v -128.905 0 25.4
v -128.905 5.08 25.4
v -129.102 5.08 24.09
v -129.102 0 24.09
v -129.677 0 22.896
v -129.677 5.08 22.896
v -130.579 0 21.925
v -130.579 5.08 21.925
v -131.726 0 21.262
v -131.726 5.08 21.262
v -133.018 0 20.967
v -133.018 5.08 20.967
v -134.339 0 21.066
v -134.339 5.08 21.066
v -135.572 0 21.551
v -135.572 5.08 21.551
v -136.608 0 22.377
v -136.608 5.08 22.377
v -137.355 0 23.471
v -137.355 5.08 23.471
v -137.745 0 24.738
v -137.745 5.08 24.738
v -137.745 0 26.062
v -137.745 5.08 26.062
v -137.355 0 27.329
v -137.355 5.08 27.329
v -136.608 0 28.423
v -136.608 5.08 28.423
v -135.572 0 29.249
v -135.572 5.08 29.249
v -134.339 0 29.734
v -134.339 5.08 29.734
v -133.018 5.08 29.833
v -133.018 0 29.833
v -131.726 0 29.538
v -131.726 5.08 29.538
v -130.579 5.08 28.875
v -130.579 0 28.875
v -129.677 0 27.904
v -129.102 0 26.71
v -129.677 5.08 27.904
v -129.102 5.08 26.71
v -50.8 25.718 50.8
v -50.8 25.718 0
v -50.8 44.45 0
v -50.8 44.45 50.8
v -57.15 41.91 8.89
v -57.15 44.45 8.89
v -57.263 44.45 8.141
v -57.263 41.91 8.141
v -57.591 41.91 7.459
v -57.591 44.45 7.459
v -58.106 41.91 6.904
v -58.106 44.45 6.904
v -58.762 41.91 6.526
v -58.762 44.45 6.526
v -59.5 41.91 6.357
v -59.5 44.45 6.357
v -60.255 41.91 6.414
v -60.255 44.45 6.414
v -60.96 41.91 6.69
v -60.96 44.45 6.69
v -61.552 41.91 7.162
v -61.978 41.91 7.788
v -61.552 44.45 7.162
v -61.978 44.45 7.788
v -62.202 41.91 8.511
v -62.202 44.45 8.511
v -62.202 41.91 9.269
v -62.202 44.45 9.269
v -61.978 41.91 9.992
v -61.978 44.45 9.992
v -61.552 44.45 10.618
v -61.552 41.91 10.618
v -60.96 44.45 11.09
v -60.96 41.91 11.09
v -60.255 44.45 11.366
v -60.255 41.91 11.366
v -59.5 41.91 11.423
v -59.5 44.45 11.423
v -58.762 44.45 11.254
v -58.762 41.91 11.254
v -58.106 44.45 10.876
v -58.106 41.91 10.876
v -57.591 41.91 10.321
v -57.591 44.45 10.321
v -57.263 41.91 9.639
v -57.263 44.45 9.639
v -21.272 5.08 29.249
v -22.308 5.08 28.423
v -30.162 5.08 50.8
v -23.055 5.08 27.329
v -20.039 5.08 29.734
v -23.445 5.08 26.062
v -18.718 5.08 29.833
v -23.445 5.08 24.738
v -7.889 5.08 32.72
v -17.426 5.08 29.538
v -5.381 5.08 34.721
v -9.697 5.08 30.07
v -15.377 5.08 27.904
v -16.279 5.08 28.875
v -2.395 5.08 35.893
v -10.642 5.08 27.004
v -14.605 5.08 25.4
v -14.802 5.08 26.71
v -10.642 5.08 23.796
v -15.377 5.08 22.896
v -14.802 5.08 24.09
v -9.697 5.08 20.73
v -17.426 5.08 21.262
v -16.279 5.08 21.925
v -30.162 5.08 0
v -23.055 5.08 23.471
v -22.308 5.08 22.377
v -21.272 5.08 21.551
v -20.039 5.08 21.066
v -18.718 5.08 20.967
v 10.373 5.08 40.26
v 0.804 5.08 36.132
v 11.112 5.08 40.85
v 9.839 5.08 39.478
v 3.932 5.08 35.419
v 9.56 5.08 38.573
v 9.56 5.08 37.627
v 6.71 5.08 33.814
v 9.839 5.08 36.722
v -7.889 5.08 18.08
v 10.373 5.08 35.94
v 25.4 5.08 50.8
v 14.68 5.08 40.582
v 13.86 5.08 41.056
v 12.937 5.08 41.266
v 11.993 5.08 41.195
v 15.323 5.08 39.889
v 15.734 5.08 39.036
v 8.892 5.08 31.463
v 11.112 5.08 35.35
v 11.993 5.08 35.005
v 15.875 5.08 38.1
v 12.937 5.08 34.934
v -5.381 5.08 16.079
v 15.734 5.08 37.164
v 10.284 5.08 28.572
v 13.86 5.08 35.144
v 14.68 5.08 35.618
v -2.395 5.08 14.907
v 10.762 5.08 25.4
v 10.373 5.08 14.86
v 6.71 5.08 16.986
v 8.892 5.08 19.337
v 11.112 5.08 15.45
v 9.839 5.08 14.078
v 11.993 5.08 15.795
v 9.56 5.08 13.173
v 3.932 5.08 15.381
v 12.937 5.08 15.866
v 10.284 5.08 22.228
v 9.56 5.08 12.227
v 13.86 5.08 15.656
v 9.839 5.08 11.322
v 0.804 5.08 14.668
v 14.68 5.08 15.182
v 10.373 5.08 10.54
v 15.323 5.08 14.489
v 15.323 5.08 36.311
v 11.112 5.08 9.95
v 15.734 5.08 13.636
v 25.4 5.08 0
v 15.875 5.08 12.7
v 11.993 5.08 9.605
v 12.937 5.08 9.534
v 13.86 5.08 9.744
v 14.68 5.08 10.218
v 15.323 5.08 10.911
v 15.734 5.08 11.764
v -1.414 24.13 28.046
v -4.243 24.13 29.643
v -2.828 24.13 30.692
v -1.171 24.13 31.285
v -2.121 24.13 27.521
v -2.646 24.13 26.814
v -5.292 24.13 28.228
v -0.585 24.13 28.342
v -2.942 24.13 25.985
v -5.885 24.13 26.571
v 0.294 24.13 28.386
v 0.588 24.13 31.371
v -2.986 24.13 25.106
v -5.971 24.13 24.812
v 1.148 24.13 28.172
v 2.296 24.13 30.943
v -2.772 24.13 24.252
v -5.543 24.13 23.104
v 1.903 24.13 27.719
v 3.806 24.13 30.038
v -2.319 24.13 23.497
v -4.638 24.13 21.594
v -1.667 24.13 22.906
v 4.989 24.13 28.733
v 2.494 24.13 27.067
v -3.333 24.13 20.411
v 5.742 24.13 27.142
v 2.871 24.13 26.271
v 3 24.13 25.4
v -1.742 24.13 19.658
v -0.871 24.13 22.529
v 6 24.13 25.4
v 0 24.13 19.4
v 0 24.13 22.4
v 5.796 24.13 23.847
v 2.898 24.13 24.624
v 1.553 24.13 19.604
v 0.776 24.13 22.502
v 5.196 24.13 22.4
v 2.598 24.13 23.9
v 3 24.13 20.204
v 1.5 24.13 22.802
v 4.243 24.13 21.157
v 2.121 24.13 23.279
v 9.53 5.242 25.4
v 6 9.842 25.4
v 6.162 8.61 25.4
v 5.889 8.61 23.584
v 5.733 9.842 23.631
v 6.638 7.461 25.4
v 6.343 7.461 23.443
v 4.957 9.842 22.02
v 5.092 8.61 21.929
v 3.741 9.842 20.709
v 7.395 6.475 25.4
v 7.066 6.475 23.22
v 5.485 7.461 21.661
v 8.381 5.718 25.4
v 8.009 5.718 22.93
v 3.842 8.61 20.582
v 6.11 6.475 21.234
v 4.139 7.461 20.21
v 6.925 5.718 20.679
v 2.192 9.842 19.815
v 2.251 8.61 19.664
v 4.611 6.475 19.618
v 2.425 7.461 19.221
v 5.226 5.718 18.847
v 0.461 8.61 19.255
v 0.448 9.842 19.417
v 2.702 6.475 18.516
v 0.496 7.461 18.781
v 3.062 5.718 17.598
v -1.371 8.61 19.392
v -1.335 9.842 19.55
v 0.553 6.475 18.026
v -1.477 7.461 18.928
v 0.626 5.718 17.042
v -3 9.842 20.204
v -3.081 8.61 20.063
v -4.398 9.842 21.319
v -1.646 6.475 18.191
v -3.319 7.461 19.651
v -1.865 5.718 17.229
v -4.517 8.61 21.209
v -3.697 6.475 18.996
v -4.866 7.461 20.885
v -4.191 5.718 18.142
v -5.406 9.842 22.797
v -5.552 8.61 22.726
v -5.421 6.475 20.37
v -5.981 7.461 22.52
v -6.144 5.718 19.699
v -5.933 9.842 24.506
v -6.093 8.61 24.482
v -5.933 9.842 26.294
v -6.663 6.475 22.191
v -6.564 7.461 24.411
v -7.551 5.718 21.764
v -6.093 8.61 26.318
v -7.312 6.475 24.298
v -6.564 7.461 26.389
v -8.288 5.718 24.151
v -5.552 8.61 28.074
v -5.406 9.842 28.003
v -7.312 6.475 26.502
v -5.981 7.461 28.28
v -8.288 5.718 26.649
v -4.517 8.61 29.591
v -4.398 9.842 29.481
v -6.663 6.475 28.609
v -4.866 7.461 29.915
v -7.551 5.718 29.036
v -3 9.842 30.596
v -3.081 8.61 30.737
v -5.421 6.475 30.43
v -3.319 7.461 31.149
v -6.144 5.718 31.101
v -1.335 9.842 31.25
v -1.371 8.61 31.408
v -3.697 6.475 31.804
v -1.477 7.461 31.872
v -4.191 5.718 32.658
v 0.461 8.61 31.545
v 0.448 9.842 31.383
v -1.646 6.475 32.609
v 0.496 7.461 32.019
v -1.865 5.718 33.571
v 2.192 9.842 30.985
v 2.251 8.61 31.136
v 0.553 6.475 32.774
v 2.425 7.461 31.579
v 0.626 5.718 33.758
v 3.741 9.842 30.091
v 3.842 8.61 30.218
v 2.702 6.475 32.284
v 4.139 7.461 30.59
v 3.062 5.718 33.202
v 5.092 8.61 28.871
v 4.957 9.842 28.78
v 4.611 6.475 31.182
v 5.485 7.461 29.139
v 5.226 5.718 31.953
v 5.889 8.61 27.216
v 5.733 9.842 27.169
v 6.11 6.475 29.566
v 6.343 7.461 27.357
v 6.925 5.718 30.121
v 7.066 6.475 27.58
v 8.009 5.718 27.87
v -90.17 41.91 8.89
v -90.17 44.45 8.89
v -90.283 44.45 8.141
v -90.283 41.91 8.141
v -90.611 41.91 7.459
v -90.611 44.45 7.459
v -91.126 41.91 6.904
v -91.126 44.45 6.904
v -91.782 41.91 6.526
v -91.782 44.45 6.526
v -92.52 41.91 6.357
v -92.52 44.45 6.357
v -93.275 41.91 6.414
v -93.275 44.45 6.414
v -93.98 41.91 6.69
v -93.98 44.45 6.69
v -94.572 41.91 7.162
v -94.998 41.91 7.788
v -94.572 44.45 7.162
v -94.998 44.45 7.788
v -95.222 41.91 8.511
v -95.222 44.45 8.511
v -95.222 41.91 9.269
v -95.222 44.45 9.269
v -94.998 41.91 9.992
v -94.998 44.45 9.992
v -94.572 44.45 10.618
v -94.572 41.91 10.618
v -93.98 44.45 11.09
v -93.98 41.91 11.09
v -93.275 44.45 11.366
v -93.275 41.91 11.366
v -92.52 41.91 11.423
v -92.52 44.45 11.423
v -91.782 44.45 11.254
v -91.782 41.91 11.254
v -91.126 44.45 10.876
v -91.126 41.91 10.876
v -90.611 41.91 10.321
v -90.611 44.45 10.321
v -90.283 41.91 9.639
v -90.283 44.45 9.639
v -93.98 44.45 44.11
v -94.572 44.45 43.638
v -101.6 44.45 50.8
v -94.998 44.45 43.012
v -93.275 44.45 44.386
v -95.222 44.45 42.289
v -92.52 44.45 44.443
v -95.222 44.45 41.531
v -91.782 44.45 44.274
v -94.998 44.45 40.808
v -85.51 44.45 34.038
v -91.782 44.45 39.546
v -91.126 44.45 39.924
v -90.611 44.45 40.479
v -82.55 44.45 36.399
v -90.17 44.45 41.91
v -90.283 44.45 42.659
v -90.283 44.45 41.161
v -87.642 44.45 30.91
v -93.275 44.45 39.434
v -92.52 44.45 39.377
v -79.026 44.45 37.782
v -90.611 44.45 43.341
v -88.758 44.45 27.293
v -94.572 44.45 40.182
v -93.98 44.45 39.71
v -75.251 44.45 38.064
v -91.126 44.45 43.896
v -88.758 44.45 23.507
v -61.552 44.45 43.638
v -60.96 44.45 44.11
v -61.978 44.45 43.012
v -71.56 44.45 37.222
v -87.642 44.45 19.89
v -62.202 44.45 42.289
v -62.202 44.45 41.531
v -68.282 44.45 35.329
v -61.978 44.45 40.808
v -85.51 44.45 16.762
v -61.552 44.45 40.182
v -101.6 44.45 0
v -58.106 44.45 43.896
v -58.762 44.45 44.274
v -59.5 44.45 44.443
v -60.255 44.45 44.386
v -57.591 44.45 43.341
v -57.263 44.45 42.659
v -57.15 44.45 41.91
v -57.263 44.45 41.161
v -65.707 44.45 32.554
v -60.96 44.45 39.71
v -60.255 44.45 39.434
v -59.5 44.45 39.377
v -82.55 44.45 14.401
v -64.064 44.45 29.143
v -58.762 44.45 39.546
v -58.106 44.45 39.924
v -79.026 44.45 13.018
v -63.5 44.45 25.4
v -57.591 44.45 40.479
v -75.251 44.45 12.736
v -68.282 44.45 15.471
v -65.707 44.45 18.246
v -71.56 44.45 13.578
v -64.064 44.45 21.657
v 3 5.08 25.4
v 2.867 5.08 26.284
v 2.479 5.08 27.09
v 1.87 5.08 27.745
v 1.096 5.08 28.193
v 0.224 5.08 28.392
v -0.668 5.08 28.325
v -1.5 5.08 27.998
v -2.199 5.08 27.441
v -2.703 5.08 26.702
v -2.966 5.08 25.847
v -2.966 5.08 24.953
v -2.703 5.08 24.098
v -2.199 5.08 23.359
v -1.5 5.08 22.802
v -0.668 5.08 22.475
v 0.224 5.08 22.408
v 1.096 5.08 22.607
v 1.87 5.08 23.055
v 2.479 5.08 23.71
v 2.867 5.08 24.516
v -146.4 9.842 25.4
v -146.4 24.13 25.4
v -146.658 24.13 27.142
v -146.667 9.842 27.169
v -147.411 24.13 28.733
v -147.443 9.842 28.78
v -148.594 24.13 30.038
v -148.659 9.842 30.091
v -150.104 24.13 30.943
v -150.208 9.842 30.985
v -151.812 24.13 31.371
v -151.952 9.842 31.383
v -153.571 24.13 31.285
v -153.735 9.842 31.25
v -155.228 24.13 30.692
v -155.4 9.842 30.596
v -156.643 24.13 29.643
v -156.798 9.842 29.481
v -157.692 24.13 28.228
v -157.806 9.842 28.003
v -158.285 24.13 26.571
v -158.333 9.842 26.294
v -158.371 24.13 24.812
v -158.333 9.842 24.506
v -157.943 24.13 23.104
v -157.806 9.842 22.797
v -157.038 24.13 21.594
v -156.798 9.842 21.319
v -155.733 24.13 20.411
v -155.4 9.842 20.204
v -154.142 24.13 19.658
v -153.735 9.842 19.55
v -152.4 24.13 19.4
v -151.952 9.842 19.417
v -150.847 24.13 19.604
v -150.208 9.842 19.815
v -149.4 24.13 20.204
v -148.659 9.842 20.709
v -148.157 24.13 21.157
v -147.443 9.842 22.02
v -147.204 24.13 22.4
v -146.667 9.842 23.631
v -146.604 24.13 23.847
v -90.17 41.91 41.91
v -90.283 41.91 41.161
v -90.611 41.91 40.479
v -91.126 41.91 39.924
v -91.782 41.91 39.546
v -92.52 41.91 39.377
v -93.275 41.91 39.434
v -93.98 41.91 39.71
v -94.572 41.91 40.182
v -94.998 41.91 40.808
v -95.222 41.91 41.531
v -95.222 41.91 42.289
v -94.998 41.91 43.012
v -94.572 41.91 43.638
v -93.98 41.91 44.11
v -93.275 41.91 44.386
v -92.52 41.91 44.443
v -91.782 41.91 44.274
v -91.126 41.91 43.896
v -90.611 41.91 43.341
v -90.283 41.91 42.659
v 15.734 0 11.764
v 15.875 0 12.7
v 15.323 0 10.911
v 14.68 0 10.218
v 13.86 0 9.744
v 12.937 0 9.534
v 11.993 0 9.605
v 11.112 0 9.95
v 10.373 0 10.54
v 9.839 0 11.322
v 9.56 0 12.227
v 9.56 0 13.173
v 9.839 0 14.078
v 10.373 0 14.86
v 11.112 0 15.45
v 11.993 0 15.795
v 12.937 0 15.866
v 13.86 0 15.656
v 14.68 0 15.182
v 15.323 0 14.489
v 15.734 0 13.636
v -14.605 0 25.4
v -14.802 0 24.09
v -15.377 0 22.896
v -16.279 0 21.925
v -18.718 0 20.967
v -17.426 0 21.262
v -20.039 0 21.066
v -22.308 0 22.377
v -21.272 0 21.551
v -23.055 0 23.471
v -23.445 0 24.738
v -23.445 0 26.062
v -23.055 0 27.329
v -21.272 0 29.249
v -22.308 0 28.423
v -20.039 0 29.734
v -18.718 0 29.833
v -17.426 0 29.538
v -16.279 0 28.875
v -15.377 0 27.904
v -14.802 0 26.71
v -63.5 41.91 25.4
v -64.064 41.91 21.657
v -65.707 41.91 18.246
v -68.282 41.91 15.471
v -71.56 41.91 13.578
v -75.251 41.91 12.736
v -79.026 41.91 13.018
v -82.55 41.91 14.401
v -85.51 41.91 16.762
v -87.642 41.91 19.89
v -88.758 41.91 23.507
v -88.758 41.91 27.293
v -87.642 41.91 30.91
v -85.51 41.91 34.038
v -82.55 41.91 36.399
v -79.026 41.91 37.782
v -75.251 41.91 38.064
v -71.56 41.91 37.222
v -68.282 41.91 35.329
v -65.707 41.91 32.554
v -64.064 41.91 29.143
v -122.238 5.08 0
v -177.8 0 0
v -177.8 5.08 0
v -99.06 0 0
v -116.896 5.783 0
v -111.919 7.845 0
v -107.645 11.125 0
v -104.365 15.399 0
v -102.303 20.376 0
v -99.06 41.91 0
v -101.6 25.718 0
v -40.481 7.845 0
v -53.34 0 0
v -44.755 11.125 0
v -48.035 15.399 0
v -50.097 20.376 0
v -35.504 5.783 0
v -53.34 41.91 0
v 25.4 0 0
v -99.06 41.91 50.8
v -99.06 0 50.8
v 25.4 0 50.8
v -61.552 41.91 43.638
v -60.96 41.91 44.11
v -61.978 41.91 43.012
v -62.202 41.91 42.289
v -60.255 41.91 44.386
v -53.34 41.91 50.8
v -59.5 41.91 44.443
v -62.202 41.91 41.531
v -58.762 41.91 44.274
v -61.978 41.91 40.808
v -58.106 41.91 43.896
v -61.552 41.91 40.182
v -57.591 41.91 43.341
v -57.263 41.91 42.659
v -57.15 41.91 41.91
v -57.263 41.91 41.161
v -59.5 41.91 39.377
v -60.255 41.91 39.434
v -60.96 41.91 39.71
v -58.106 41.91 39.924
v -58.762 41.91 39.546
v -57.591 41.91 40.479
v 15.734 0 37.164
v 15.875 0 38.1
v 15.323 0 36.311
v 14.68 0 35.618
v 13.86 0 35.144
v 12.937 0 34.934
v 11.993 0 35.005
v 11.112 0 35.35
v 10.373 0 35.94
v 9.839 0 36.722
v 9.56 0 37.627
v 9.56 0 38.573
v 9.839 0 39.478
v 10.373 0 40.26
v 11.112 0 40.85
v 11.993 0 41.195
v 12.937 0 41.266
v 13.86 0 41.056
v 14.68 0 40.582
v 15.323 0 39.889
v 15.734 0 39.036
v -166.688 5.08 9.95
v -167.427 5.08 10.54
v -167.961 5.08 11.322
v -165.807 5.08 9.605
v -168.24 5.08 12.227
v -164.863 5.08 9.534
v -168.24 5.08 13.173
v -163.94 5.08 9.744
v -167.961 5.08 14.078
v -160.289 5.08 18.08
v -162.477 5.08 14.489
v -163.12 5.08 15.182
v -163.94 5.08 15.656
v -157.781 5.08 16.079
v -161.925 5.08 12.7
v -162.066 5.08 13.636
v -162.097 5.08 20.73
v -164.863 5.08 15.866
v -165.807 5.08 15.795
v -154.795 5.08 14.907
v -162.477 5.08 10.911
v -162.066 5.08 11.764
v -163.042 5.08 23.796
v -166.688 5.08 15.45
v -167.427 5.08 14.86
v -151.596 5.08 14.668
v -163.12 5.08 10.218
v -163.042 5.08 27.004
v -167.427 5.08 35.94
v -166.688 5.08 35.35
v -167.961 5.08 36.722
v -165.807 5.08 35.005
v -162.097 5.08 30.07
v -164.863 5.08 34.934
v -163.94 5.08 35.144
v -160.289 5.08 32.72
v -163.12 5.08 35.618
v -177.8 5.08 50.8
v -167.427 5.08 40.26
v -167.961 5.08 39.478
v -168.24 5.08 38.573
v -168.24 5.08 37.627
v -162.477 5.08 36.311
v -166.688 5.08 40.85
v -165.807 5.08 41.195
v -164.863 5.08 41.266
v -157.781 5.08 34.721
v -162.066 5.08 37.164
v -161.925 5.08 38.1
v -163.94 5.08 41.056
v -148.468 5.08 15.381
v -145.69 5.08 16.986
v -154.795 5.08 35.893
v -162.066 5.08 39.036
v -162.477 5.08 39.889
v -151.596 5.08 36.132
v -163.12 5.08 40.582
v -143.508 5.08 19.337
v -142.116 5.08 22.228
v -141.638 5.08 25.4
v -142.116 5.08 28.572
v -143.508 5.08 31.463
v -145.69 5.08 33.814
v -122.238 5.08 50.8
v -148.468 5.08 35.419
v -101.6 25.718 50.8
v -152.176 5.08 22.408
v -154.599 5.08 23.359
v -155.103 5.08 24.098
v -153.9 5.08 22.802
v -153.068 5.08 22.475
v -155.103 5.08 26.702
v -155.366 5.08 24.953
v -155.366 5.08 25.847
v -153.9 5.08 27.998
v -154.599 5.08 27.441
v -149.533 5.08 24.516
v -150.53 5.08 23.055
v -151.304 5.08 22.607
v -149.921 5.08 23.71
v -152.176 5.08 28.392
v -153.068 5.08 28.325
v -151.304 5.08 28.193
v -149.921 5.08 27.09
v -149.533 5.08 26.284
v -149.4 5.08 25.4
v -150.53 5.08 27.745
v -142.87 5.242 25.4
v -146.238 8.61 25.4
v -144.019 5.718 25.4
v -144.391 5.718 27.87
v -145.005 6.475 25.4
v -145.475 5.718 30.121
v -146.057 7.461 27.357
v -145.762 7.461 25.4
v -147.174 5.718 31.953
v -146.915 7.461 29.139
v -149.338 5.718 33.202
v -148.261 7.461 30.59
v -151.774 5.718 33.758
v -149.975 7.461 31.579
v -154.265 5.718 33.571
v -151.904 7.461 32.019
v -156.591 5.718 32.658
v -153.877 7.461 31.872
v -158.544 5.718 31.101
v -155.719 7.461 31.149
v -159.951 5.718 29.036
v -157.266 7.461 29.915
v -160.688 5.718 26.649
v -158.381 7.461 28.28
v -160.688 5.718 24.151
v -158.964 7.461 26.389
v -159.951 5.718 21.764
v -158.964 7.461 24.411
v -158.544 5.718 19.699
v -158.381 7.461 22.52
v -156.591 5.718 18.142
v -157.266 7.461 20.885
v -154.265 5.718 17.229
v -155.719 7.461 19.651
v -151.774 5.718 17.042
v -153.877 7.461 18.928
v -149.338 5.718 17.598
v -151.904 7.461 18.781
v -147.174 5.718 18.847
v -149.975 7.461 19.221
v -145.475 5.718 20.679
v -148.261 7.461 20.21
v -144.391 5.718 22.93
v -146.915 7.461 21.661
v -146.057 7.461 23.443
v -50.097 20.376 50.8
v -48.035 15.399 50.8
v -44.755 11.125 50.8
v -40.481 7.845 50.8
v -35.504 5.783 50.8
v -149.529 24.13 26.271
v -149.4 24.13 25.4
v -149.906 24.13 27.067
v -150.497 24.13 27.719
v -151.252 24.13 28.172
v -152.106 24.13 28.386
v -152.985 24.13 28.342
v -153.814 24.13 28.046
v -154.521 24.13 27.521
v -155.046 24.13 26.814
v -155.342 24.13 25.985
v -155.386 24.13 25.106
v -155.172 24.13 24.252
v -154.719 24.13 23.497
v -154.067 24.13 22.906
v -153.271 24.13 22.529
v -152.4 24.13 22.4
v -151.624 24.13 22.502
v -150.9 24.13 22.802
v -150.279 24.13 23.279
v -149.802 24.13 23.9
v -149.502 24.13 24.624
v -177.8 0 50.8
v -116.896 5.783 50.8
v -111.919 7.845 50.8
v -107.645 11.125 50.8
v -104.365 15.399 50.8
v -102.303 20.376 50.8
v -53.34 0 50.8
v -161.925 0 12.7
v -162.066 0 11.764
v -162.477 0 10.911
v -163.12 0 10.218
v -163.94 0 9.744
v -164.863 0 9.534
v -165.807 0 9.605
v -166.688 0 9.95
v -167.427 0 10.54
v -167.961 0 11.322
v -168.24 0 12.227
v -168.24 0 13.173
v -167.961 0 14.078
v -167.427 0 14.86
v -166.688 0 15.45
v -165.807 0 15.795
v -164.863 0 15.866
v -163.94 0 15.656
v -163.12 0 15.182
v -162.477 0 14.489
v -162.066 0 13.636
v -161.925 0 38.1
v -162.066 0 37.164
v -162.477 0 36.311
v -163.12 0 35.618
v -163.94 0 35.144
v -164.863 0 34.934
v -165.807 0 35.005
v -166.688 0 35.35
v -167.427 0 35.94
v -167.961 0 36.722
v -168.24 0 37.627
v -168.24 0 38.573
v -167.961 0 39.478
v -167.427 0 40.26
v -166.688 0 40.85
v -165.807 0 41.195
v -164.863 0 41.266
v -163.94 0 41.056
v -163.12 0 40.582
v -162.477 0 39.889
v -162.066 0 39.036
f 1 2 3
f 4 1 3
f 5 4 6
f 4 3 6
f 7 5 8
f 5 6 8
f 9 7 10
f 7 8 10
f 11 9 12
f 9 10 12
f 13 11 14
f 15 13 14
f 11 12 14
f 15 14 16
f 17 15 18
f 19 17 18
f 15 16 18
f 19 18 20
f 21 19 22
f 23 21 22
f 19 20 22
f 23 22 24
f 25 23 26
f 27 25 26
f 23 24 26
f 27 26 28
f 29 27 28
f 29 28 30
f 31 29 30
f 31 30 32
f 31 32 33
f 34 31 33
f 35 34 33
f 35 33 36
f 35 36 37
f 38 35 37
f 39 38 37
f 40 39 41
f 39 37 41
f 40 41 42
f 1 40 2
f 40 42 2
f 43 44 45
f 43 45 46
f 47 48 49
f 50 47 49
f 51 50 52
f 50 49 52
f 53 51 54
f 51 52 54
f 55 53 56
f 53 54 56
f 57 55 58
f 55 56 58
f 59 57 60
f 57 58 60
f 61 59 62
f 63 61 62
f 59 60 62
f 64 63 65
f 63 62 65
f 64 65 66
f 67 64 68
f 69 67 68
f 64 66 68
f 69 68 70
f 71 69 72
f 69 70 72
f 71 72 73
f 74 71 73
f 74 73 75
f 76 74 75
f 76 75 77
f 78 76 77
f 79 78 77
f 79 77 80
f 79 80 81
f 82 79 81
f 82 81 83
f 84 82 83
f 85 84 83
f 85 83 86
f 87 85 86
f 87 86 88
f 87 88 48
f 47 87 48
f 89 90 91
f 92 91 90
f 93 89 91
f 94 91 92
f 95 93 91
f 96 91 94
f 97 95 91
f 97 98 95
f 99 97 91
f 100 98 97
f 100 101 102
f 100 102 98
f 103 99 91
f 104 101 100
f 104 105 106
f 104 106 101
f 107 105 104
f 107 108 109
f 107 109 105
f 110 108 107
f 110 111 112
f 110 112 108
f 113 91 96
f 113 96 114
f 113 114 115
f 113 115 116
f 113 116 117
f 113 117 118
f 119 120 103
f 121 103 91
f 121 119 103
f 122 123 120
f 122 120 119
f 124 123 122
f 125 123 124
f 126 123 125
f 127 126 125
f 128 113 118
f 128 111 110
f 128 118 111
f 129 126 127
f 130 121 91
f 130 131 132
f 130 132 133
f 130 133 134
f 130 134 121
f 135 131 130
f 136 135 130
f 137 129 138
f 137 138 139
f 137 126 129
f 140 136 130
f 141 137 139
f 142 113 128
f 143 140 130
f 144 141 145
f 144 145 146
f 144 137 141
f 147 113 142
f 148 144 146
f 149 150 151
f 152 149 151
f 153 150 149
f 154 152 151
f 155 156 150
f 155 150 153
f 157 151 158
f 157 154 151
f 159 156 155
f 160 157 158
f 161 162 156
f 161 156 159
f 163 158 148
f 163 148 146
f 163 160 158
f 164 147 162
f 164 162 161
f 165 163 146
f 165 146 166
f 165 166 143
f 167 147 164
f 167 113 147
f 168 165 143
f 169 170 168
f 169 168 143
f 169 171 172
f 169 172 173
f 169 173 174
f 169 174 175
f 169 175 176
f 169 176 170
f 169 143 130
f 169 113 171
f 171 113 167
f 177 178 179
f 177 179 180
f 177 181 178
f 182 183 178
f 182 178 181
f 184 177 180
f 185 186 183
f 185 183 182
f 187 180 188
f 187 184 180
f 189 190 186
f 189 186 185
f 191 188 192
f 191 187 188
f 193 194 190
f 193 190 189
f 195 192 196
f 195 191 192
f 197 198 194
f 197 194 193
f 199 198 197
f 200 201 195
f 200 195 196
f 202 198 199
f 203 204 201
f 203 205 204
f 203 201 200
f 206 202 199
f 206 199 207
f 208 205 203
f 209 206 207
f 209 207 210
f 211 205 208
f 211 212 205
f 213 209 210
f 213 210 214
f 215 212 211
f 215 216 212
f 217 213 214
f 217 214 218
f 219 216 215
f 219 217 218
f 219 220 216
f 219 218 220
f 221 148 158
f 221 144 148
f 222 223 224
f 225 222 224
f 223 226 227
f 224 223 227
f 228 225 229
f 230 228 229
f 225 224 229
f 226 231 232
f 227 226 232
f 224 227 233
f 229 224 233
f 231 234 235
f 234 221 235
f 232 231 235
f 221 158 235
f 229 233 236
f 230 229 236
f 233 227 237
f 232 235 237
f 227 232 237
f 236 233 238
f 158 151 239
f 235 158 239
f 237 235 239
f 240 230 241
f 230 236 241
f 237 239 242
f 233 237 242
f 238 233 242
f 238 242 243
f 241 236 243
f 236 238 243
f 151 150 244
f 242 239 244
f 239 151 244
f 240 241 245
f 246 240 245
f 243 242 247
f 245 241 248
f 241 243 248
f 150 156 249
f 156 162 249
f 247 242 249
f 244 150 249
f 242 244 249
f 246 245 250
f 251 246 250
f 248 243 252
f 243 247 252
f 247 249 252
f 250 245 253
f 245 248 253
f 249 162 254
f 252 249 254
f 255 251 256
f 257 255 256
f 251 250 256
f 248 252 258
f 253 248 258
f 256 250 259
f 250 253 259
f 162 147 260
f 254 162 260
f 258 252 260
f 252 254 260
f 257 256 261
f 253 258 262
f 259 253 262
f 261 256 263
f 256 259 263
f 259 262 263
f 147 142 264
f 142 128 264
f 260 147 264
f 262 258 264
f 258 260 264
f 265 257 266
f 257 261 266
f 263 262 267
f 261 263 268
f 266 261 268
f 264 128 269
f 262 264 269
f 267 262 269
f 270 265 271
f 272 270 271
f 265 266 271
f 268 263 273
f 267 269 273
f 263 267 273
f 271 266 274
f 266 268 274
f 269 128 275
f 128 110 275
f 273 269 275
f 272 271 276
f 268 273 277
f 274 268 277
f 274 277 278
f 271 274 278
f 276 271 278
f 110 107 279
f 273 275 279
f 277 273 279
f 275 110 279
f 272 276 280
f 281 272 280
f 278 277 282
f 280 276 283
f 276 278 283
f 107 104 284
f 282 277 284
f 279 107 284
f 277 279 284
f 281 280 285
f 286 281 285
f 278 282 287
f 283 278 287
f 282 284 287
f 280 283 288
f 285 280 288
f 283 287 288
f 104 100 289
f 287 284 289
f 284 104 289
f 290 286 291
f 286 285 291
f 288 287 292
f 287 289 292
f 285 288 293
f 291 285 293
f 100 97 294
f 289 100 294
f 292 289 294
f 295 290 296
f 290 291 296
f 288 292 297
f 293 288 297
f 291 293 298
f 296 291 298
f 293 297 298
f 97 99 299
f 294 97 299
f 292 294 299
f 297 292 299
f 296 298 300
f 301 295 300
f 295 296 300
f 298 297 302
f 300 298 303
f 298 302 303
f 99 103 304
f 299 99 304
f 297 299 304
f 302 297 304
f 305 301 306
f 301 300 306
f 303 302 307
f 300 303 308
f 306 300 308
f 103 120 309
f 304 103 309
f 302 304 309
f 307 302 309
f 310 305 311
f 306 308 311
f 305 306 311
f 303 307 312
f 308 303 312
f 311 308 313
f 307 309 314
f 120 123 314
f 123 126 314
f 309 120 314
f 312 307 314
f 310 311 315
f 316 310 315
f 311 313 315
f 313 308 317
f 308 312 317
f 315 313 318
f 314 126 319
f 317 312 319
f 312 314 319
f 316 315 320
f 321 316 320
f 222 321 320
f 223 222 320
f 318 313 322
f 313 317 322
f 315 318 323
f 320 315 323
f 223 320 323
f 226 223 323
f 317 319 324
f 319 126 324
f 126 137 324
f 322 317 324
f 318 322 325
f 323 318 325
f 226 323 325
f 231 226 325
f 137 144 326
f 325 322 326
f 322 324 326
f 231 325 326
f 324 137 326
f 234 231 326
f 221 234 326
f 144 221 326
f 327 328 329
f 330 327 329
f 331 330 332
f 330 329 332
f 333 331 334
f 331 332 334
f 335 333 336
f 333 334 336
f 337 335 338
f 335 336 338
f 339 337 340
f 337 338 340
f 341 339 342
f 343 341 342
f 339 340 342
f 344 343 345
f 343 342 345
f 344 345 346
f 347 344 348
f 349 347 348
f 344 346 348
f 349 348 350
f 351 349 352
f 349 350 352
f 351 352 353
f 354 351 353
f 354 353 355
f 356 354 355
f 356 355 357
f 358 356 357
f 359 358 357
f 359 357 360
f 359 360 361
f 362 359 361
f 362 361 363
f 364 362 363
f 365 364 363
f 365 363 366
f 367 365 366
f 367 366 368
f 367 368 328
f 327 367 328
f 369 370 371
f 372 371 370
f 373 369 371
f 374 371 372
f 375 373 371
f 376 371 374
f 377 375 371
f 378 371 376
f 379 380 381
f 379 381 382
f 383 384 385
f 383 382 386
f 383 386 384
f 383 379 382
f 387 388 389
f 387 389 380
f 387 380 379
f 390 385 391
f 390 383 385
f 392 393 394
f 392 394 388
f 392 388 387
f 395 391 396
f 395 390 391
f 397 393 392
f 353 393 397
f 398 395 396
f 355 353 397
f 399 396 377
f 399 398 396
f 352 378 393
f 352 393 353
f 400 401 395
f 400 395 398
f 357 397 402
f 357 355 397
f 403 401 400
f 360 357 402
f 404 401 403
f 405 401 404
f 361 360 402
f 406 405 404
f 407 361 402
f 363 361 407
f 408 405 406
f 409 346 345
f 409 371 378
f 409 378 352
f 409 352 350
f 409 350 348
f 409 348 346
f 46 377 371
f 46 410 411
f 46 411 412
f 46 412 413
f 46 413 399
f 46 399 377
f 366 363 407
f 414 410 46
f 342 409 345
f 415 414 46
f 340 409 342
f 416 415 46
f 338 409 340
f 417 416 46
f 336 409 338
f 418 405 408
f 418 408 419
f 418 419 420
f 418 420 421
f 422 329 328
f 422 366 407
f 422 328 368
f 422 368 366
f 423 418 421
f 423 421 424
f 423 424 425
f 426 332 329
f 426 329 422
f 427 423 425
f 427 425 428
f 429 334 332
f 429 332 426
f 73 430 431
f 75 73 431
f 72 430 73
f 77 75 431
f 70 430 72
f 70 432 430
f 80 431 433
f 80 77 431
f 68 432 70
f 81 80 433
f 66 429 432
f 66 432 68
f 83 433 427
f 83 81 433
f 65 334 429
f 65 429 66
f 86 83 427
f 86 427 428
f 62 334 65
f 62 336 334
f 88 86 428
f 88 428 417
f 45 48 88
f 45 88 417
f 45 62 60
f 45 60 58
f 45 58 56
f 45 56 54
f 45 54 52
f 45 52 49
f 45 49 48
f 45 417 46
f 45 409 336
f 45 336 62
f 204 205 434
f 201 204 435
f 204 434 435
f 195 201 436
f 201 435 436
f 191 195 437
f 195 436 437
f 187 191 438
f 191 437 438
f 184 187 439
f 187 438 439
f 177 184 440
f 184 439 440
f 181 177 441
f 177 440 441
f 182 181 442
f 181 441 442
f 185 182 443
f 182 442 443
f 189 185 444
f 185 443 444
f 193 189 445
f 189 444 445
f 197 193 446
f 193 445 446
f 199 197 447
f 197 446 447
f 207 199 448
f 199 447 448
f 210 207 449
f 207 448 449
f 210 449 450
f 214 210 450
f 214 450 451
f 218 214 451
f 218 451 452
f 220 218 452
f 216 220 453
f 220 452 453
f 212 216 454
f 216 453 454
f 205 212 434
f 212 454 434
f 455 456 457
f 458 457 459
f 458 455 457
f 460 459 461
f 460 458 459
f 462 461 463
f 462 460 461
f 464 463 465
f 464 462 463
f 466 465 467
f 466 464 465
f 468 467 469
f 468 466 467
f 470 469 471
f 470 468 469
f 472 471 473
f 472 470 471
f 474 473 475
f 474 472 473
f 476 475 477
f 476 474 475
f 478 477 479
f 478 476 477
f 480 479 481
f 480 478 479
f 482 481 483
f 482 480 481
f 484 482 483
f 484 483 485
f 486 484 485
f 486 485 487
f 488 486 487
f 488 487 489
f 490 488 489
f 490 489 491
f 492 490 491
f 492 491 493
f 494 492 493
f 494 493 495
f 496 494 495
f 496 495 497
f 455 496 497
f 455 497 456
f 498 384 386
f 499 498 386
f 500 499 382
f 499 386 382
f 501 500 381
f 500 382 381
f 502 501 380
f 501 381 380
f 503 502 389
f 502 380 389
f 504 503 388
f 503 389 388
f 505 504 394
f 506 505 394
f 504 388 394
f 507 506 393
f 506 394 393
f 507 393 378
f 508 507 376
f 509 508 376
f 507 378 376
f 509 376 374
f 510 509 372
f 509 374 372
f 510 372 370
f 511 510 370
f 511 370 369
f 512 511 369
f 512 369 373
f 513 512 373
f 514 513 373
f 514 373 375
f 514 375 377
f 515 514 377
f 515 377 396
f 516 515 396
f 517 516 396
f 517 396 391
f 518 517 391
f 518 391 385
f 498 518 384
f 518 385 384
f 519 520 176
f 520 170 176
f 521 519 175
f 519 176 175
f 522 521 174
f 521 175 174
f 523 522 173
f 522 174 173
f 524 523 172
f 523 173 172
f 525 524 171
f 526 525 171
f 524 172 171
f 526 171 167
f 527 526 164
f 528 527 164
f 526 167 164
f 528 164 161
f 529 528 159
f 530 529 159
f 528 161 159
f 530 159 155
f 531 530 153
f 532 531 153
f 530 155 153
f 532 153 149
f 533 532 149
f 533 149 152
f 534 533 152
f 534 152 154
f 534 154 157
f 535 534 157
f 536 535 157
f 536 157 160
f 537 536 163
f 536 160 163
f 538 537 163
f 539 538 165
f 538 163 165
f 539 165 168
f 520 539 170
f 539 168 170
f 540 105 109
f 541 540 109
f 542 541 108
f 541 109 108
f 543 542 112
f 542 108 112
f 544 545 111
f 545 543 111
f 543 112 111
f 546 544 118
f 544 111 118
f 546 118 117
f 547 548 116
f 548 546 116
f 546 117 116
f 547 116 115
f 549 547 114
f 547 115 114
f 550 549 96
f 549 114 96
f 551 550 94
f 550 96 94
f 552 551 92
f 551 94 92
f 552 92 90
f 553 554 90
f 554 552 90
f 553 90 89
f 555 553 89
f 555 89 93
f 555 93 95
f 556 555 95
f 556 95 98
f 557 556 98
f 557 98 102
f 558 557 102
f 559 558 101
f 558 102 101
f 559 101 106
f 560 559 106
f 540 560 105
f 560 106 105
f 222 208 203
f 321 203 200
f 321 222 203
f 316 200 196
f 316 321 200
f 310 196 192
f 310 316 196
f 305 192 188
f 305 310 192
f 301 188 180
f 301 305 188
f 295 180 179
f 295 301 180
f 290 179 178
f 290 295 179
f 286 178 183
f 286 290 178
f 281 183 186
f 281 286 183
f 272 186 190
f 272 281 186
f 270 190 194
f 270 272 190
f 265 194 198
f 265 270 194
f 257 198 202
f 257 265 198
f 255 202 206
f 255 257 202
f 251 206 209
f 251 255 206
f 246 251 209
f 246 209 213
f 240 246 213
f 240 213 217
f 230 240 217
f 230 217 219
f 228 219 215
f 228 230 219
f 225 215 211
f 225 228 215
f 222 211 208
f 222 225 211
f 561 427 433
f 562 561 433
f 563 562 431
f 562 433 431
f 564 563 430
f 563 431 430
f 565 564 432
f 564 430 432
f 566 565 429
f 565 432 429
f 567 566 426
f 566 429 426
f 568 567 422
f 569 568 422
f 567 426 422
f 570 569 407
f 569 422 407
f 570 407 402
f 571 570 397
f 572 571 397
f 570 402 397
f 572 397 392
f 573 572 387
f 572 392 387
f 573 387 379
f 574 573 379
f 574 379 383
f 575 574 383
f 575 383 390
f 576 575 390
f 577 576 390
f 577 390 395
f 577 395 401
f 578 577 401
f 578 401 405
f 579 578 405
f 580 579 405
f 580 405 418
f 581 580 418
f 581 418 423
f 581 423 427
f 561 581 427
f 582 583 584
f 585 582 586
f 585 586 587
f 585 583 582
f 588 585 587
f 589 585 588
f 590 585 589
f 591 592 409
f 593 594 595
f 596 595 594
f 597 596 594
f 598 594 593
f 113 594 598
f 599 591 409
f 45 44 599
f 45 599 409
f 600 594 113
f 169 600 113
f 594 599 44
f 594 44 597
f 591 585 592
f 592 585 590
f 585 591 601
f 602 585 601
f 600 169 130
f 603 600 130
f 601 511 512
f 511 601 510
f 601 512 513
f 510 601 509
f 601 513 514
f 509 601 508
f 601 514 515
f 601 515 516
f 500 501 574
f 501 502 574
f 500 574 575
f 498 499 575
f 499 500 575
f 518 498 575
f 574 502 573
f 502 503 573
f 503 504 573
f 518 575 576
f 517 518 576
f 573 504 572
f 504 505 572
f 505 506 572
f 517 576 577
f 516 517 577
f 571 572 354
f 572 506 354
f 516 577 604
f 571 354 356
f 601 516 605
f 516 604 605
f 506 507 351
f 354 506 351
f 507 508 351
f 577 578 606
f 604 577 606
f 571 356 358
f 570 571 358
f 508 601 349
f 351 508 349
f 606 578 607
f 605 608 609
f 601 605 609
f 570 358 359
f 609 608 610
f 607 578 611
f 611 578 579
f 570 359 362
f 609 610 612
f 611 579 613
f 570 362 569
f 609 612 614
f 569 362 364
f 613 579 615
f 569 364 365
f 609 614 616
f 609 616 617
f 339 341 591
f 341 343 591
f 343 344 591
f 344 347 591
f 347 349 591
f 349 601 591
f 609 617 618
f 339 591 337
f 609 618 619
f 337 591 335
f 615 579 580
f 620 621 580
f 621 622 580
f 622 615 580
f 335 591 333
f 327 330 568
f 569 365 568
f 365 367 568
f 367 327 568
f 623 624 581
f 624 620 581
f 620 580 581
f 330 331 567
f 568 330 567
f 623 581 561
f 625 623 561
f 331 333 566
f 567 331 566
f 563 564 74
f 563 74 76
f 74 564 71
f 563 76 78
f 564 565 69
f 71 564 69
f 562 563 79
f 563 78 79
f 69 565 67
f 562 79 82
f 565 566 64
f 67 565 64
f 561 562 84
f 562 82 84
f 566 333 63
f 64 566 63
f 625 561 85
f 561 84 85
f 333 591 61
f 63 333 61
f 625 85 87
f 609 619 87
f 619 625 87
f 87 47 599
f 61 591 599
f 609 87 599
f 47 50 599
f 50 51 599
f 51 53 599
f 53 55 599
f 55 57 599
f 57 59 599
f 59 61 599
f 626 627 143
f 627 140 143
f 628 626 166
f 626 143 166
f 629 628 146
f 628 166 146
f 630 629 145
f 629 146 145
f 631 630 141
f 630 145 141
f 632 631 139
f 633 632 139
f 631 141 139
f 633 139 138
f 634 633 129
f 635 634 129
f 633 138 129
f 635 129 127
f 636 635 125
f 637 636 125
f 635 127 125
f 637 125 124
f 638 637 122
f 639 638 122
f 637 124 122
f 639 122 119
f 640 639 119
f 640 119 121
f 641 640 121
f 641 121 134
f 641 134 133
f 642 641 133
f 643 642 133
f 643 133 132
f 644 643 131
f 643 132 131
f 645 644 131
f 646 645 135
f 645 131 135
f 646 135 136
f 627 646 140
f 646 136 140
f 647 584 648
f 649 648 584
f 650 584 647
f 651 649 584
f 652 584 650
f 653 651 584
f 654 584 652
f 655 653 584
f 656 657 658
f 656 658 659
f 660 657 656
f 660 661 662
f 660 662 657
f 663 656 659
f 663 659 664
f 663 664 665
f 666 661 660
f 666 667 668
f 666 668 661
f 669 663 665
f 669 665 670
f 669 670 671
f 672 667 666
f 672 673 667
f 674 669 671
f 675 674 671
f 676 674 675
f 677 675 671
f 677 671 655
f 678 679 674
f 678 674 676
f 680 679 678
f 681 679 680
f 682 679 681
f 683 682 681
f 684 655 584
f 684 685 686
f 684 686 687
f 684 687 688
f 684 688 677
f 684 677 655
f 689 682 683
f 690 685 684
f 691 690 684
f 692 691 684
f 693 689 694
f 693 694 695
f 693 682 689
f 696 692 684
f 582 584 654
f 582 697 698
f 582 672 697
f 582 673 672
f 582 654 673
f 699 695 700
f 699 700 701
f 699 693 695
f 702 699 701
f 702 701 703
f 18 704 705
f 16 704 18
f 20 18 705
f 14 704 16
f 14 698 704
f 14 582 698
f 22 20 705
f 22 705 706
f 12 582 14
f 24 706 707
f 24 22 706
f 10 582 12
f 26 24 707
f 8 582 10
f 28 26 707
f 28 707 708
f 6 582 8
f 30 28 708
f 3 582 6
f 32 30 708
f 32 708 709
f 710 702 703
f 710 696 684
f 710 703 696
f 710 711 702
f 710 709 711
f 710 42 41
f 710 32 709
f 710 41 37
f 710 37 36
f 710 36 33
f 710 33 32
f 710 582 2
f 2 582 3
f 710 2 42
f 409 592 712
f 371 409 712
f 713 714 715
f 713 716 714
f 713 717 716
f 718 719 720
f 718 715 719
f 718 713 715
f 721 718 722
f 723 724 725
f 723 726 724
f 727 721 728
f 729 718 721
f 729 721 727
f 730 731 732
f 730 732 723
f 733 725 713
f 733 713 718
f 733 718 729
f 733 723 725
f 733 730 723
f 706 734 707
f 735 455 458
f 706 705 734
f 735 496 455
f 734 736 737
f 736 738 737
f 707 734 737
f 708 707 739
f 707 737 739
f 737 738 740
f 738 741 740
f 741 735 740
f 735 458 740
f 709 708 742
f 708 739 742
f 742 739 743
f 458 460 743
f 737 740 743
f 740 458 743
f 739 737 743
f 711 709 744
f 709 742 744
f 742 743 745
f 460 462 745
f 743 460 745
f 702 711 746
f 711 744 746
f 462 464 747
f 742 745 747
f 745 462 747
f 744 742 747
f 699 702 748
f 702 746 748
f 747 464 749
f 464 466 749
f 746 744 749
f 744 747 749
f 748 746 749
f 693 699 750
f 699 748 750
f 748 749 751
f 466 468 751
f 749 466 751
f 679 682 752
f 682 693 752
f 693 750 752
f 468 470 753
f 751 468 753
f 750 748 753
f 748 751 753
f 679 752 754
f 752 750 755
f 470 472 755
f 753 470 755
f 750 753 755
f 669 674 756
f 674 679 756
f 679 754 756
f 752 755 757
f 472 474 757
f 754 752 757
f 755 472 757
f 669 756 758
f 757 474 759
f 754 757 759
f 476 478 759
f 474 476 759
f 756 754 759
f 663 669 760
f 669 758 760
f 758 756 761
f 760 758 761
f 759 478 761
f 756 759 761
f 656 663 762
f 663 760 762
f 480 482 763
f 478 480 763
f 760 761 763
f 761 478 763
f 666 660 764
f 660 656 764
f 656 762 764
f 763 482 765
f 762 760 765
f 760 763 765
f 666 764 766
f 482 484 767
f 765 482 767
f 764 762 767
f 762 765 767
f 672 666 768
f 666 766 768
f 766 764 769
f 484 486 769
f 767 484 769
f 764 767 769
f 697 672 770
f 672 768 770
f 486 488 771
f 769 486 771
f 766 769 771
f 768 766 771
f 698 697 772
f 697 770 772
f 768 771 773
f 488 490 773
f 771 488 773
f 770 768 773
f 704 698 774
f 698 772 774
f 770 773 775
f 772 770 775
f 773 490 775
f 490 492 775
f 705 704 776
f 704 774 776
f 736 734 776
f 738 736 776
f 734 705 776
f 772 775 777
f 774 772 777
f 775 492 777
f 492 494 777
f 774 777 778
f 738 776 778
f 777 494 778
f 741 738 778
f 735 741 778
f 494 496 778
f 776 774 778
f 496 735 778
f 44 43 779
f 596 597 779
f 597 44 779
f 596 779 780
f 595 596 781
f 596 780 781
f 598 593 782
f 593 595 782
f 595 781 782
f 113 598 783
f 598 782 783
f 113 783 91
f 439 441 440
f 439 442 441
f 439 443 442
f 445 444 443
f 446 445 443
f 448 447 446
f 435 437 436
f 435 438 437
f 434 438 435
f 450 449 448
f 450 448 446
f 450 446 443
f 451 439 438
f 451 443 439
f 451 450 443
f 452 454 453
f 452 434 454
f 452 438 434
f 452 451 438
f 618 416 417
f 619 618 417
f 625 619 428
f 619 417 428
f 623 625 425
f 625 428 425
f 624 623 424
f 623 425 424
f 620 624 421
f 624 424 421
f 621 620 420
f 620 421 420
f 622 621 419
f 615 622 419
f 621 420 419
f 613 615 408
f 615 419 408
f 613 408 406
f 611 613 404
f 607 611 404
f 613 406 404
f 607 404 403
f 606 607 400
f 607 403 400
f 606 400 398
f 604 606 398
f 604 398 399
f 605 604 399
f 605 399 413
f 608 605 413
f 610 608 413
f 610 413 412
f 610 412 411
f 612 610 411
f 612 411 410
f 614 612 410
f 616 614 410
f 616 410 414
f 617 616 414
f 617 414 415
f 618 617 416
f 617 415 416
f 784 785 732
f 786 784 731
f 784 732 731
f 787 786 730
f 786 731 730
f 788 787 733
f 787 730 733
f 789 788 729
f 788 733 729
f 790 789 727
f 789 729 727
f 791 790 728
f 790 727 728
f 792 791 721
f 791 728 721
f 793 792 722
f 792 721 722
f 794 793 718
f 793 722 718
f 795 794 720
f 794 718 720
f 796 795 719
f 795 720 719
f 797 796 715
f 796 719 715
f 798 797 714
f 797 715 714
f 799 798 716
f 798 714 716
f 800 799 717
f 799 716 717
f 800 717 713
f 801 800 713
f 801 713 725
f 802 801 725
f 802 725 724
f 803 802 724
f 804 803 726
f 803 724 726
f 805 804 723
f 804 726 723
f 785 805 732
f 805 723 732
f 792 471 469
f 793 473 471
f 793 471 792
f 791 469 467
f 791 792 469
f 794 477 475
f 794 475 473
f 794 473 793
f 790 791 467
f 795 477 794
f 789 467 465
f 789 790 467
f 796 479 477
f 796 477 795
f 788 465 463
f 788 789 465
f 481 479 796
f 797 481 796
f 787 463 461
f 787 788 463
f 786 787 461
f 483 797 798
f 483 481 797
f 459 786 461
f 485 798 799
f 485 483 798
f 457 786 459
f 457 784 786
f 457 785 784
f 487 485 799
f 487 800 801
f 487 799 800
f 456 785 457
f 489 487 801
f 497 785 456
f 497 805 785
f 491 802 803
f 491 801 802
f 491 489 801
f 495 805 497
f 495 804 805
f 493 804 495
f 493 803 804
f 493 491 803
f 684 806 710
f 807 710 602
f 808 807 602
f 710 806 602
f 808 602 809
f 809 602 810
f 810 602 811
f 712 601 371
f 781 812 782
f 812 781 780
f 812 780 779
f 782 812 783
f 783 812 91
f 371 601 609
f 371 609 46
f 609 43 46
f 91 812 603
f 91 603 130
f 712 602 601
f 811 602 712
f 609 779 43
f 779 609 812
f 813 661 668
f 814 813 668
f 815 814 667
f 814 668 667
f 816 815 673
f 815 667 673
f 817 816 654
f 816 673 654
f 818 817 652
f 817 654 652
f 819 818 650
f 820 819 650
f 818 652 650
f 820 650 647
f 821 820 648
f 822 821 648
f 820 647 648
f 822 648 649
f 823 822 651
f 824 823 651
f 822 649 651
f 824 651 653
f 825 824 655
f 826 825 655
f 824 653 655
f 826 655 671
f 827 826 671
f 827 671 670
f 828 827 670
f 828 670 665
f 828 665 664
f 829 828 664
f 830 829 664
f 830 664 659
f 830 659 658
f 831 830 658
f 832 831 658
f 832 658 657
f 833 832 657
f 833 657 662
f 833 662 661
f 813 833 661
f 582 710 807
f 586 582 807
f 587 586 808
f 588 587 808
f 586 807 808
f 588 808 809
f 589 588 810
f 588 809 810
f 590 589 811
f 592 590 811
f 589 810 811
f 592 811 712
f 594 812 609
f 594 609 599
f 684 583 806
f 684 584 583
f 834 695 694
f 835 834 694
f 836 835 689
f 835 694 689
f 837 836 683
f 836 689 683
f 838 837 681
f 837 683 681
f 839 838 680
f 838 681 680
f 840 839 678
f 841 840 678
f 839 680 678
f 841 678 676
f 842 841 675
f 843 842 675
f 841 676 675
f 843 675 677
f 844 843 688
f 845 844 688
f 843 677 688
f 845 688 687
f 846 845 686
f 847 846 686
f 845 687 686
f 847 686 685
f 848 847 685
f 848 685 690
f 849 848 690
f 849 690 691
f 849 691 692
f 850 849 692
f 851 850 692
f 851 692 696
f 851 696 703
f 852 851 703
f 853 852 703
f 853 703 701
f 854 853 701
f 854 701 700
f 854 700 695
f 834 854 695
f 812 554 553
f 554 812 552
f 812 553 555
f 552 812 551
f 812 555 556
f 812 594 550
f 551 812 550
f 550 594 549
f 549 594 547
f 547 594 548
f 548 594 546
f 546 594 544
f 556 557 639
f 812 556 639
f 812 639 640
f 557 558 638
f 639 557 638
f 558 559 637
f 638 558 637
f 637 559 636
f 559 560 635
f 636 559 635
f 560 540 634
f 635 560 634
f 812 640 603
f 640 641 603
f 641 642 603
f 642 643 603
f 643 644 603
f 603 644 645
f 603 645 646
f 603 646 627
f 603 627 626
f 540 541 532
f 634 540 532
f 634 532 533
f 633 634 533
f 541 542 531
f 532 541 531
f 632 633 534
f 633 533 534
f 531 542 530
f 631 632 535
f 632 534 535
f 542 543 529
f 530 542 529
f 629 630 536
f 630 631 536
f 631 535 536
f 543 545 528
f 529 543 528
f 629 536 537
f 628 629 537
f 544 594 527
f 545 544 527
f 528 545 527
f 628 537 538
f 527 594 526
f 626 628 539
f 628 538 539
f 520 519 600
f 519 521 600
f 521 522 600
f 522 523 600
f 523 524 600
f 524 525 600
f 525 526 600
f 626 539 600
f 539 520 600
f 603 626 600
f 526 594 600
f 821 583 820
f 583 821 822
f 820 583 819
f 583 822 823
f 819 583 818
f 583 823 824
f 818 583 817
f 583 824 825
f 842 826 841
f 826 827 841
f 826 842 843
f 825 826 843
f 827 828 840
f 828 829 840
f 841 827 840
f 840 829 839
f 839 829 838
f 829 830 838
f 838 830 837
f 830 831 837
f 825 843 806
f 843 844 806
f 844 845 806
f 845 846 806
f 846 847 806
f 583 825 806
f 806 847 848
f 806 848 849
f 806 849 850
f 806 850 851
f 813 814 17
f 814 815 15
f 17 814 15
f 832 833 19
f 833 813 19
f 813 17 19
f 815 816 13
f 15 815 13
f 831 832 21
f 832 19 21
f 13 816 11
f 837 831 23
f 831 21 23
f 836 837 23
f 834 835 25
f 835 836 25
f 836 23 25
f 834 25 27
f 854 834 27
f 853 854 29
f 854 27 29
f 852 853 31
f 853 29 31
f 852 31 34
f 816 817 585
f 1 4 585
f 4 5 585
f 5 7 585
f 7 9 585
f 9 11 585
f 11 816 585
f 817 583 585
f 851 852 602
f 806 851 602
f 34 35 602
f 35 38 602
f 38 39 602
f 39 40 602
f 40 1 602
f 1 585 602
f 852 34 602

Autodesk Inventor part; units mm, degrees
ref_plane "YZ Plane" through (0, 0, 0) normal (1, 0, 0) x (0, 1, 0)
ref_plane "XZ Plane" through (0, 0, 0) normal (0, 1, 0) x (-1, 0, 0)
ref_plane "XY Plane" through (0, 0, 0) normal (0, 0, 1) x (1, 0, 0)
sketch "Sketch1" plane through (0, 0, 0) normal (0, 1, 0) x (-1, 0, 0)
  line L0 (0, 0) -> (152.4, 0)
  line L1 (152.4, 0) -> (152.4, 50.8)
  line L2 (152.4, 50.8) -> (0, 50.8)
  line L3 (0, 50.8) -> (0, 0)
  dimension "d0" = 152.4
  dimension "d1" = 50.8
extrude "Extrusion1" add sketch "Sketch1" along normal blind 5.08
sketch "Sketch2" plane through (0, 5.08, 0) normal (0, 1, 0) x (1, 0, 0)
  line L0 (0, 0) -> (-152.4, 0) projected
  line L1 (-152.4, -50.8) -> (0, -50.8) projected
  line L2 (-76.2, 0) -> (-76.2, -25.4)
  line L3 (-76.2, -25.4) -> (-59.69, -25.4)
  line L4 (-59.69, -25.4) -> (-59.69, -8.89)
  line L5 (-59.69, -8.89) -> (-53.34, -8.89)
  line L6 (-53.34, -8.89) -> (-53.34, -50.8)
  line L7 (-53.34, -8.89) -> (-53.34, 0)
  line L8 (-53.34, 0) -> (-50.8, 0)
  line L9 (-50.8, 0) -> (-50.8, -50.8)
  line L10 (-53.34, -50.8) -> (-50.8, -50.8)
  dimension "d4" = 16.51
  dimension "d5" = 16.51
  dimension "d6" = 6.35
  dimension "d7" = 2.54
extrude "Extrusion2" add sketch "Sketch2" along normal blind 36.83 contours L9 L1 L6 L7 L0
sketch "Sketch3" plane through (0, 5.08, 0) normal (0, 1, 0) x (1, 0, 0)
  line L0 (-53.34, 0) -> (-152.4, 0) projected
  line L1 (-152.4, -50.8) -> (-53.34, -50.8) projected
  line L2 (-152.4, 0) -> (-76.2, 0)
  line L3 (-76.2, 0) -> (-76.2, -25.4)
  line L4 (-76.2, -25.4) -> (-92.71, -25.4)
  line L5 (-92.71, -25.4) -> (-99.06, -25.4)
  line L6 (-99.06, -25.4) -> (-99.06, 0)
  line L7 (-99.06, 0) -> (-101.6, 0)
  line L8 (-101.6, 0) -> (-101.6, -50.8)
  line L9 (-101.6, -50.8) -> (-99.06, -50.8)
  line L10 (-99.06, -25.4) -> (-99.06, -50.8)
  point P0 (0, 0)
  dimension "d10" = 76.2
  dimension "d11" = 16.51
  dimension "d12" = 6.35
  dimension "d13" = 2.54
extrude "Extrusion3" add sketch "Sketch3" along normal blind 36.83 contours L6 L10 L1 L8 L0
sketch "Sketch4" plane through (0, 41.91, 0) normal (0, 1, 0) x (1, 0, 0)
  line L0 (-101.6, 0) -> (-101.6, -50.8) projected
  line L1 (-101.6, 0) -> (-50.8, 0)
  line L2 (-50.8, 0) -> (-50.8, -50.8)
  line L3 (-50.8, -50.8) -> (-101.6, -50.8)
  point P0 (0, 0)
  dimension "d16" = 50.8
extrude "Extrusion4" add sketch "Sketch4" along normal blind 2.54
sketch "Sketch5" plane through (0, 5.08, 0) normal (0, 1, 0) x (1, 0, 0)
  line L0 (-99.06, 0) -> (-99.06, -50.8) projected
  line L1 (-99.06, -50.8) -> (-53.34, -50.8) projected
  line L2 (-53.34, -50.8) -> (-53.34, 0) projected
  line L3 (-53.34, 0) -> (-99.06, 0) projected
  point P0 (0, 0)
extrude "Extrusion5" cut sketch "Sketch5" against normal blind 13.6525
sketch "Sketch6" plane through (0, 44.45, 0) normal (0, 1, 0) x (1, 0, 0)
  line L0 (-50.8, 0) -> (-101.6, 0) projected
  line L1 (-101.6, 0) -> (-101.6, -50.8) projected
  line L2 (-76.2, 0) -> (-76.2, -25.4)
  circle A0 centre (-76.2, -25.4) radius 12.7
  line L3 (-76.2, -25.4) -> (-59.69, -25.4)
  line L4 (-59.69, -25.4) -> (-59.69, -8.89)
  circle A1 centre (-59.69, -8.89) radius 2.54
  line L5 (-59.69, -25.4) -> (-59.69, -41.91)
  circle A2 centre (-59.69, -41.91) radius 2.54
  line L6 (-76.2, -25.4) -> (-92.71, -25.4)
  line L7 (-92.71, -25.4) -> (-92.71, -8.89)
  circle A3 centre (-92.71, -8.89) radius 2.54
  line L8 (-92.71, -25.4) -> (-92.71, -41.91)
  circle A4 centre (-92.71, -41.91) radius 2.54
  point P0 (0, 0)
  dimension "d21" = 25.4
  dimension "d22" = 16.51
  dimension "d23" = 16.51
  dimension "d24" = 5.08
  dimension "d25" = 16.51
  dimension "d26" = 5.08
  dimension "d27" = 16.51
  dimension "d28" = 16.51
  dimension "d29" = 5.08
  dimension "d30" = 16.51
  dimension "d31" = 5.08
extrude "Extrusion6" cut sketch "Sketch6" against normal blind 13.6525
sketch "Sketch7" plane through (0, 5.08, 0) normal (0, 1, 0) x (1, 0, 0)
  line L0 (0, -50.8) -> (0, 0) projected
  line L1 (0, 0) -> (-50.8, 0) projected
  line L2 (0, 0) -> (25.4, 0)
  line L3 (25.4, 0) -> (25.4, -50.8)
  line L4 (25.4, -50.8) -> (0, -50.8)
  dimension "d34" = 25.4
extrude "Extrusion7" add sketch "Sketch7" against normal blind 5.08
sketch "Sketch8" plane through (-152.4, 0, 0) normal (-1, 0, 0) x (0, 0, 1)
  line L0 (0, 0) -> (50.8, 0) projected
  line L1 (50.8, 0) -> (50.8, 5.08) projected
  line L2 (0, 5.08) -> (50.8, 5.08) projected
  line L3 (0, 0) -> (0, 5.08) projected
extrude "Extrusion8" add sketch "Sketch8" along normal blind 25.4
sketch "Sketch9" plane through (0, 5.08, 0) normal (0, 1, 0) x (1, 0, 0)
  line L0 (-101.6, 0) -> (-177.8, 0) projected
  line L1 (-101.6, 0) -> (-152.4, 0)
  line L2 (-152.4, 0) -> (-152.4, -25.4)
  circle A0 centre (-152.4, -25.4) radius 6
  circle A1 centre (-152.4, -25.4) radius 3
  point P0 (0, 0)
  dimension "d39" = 50.8
  dimension "d40" = 12
  dimension "d41" = 6
extrude "Extrusion9" add sketch "Sketch9" along normal blind 19.05
sketch "Sketch10" plane through (0, 5.08, 0) normal (0, 1, 0) x (1, 0, 0)
  line L0 (25.4, 0) -> (-50.8, 0) projected
  line L1 (-50.8, 0) -> (0, 0)
  line L2 (0, 0) -> (0, -25.4)
  line L3 (0, -25.4) -> (0, 0)
  circle A0 centre (0, -25.4) radius 3
  circle A1 centre (0, -25.4) radius 6
  dimension "d44" = 50.8
  dimension "d45" = 6
  dimension "d46" = 12
extrude "Extrusion10" add sketch "Sketch10" along normal blind 19.05
fillet "Fillet1" radius 4.7625 2 edges at (-158.4, 5.08, 25.4) (-6, 5.08, 25.4)
fillet "Fillet2" radius 20.6375 2 edges at (-50.8, 5.08, 25.4) (-101.6, 5.08, 25.4)
sketch "Sketch11" plane through (0, 5.08, 0) normal (0, 1, 0) x (1, 0, 0)
  line L0 (-122.2375, 0) -> (-177.8, 0) projected
  line L1 (-122.2375, -50.8) -> (-177.8, -50.8) projected
  line L2 (-177.8, 0) -> (-165.1, 0)
  line L3 (-165.1, 0) -> (-165.1, -12.7)
  circle A0 centre (-165.1, -12.7) radius 3.175
  line L4 (-177.8, -50.8) -> (-165.1, -50.8)
  line L5 (-165.1, -50.8) -> (-165.1, -38.1)
  circle A1 centre (-165.1, -38.1) radius 3.175
  point P0 (0, 0)
  dimension "d51" = 12.7
  dimension "d52" = 12.7
  dimension "d53" = 6.35
  dimension "d54" = 12.7
  dimension "d55" = 12.7
  dimension "d56" = 6.35
extrude "Extrusion11" cut sketch "Sketch11" against normal blind 19.05
sketch "Sketch12" plane through (0, 5.08, 0) normal (0, 1, 0) x (1, 0, 0)
  line L0 (-30.1625, -50.8) -> (25.4, -50.8) projected
  line L1 (25.4, 0) -> (-30.1625, 0) projected
  line L2 (25.4, 0) -> (12.7, 0)
  line L3 (12.7, 0) -> (12.7, -12.7)
  circle A0 centre (12.7, -12.7) radius 3.175
  line L4 (25.4, -50.8) -> (12.7, -50.8)
  line L5 (12.7, -50.8) -> (12.7, -38.1)
  circle A1 centre (12.7, -38.1) radius 3.175
  point P0 (0, 0)
  dimension "d59" = 12.7
  dimension "d60" = 12.7
  dimension "d61" = 6.35
  dimension "d62" = 12.7
  dimension "d63" = 12.7
  dimension "d64" = 6.35
extrude "Extrusion12" cut sketch "Sketch12" against normal blind 19.05
sketch "Sketch13" plane through (0, 5.08, 0) normal (0, 1, 0) x (1, 0, 0)
  line L0 (-122.2375, 0) -> (-177.8, 0) projected
  line L1 (-177.8, 0) -> (-133.35, 0)
  line L2 (-133.35, 0) -> (-133.35, -25.4)
  circle A0 centre (-133.35, -25.4) radius 4.445
  point P0 (0, 0)
  dimension "d67" = 44.45
  dimension "d68" = 8.89
sketch "Sketch14" plane through (0, 5.08, 0) normal (0, 1, 0) x (1, 0, 0)
  line L0 (25.4, 0) -> (-30.1625, 0) projected
  line L1 (25.4, 0) -> (-19.05, 0)
  line L2 (-19.05, 0) -> (-19.05, -25.4)
  circle A0 centre (-19.05, -25.4) radius 4.445
  point P0 (0, 0)
  dimension "d69" = 44.45
  dimension "d70" = 8.89
extrude "Extrusion13" cut sketch "Sketch13" against normal blind 19.05
extrude "Extrusion14" cut sketch "Sketch14" against normal blind 19.05
sketch "Sketch15" plane through (0, 44.45, 0) normal (0, 1, 0) x (1, 0, 0)
  circle A0 centre (-92.71, -41.91) radius 2.54 projected
  circle A1 centre (-59.69, -41.91) radius 2.54 projected
  circle A2 centre (-59.69, -8.89) radius 2.54 projected
  circle A3 centre (-92.71, -8.89) radius 2.54 projected
  circle A4 centre (-76.2, -25.4) radius 12.7 projected
  line L0 (-101.6, -50.8) -> (-50.8, -50.8) projected
  line L1 (-50.8, -50.8) -> (-50.8, 0) projected
  line L2 (-50.8, 0) -> (-101.6, 0) projected
  line L3 (-101.6, 0) -> (-101.6, -50.8) projected
  point P0 (0, 0)
properties part number "Base plate"
